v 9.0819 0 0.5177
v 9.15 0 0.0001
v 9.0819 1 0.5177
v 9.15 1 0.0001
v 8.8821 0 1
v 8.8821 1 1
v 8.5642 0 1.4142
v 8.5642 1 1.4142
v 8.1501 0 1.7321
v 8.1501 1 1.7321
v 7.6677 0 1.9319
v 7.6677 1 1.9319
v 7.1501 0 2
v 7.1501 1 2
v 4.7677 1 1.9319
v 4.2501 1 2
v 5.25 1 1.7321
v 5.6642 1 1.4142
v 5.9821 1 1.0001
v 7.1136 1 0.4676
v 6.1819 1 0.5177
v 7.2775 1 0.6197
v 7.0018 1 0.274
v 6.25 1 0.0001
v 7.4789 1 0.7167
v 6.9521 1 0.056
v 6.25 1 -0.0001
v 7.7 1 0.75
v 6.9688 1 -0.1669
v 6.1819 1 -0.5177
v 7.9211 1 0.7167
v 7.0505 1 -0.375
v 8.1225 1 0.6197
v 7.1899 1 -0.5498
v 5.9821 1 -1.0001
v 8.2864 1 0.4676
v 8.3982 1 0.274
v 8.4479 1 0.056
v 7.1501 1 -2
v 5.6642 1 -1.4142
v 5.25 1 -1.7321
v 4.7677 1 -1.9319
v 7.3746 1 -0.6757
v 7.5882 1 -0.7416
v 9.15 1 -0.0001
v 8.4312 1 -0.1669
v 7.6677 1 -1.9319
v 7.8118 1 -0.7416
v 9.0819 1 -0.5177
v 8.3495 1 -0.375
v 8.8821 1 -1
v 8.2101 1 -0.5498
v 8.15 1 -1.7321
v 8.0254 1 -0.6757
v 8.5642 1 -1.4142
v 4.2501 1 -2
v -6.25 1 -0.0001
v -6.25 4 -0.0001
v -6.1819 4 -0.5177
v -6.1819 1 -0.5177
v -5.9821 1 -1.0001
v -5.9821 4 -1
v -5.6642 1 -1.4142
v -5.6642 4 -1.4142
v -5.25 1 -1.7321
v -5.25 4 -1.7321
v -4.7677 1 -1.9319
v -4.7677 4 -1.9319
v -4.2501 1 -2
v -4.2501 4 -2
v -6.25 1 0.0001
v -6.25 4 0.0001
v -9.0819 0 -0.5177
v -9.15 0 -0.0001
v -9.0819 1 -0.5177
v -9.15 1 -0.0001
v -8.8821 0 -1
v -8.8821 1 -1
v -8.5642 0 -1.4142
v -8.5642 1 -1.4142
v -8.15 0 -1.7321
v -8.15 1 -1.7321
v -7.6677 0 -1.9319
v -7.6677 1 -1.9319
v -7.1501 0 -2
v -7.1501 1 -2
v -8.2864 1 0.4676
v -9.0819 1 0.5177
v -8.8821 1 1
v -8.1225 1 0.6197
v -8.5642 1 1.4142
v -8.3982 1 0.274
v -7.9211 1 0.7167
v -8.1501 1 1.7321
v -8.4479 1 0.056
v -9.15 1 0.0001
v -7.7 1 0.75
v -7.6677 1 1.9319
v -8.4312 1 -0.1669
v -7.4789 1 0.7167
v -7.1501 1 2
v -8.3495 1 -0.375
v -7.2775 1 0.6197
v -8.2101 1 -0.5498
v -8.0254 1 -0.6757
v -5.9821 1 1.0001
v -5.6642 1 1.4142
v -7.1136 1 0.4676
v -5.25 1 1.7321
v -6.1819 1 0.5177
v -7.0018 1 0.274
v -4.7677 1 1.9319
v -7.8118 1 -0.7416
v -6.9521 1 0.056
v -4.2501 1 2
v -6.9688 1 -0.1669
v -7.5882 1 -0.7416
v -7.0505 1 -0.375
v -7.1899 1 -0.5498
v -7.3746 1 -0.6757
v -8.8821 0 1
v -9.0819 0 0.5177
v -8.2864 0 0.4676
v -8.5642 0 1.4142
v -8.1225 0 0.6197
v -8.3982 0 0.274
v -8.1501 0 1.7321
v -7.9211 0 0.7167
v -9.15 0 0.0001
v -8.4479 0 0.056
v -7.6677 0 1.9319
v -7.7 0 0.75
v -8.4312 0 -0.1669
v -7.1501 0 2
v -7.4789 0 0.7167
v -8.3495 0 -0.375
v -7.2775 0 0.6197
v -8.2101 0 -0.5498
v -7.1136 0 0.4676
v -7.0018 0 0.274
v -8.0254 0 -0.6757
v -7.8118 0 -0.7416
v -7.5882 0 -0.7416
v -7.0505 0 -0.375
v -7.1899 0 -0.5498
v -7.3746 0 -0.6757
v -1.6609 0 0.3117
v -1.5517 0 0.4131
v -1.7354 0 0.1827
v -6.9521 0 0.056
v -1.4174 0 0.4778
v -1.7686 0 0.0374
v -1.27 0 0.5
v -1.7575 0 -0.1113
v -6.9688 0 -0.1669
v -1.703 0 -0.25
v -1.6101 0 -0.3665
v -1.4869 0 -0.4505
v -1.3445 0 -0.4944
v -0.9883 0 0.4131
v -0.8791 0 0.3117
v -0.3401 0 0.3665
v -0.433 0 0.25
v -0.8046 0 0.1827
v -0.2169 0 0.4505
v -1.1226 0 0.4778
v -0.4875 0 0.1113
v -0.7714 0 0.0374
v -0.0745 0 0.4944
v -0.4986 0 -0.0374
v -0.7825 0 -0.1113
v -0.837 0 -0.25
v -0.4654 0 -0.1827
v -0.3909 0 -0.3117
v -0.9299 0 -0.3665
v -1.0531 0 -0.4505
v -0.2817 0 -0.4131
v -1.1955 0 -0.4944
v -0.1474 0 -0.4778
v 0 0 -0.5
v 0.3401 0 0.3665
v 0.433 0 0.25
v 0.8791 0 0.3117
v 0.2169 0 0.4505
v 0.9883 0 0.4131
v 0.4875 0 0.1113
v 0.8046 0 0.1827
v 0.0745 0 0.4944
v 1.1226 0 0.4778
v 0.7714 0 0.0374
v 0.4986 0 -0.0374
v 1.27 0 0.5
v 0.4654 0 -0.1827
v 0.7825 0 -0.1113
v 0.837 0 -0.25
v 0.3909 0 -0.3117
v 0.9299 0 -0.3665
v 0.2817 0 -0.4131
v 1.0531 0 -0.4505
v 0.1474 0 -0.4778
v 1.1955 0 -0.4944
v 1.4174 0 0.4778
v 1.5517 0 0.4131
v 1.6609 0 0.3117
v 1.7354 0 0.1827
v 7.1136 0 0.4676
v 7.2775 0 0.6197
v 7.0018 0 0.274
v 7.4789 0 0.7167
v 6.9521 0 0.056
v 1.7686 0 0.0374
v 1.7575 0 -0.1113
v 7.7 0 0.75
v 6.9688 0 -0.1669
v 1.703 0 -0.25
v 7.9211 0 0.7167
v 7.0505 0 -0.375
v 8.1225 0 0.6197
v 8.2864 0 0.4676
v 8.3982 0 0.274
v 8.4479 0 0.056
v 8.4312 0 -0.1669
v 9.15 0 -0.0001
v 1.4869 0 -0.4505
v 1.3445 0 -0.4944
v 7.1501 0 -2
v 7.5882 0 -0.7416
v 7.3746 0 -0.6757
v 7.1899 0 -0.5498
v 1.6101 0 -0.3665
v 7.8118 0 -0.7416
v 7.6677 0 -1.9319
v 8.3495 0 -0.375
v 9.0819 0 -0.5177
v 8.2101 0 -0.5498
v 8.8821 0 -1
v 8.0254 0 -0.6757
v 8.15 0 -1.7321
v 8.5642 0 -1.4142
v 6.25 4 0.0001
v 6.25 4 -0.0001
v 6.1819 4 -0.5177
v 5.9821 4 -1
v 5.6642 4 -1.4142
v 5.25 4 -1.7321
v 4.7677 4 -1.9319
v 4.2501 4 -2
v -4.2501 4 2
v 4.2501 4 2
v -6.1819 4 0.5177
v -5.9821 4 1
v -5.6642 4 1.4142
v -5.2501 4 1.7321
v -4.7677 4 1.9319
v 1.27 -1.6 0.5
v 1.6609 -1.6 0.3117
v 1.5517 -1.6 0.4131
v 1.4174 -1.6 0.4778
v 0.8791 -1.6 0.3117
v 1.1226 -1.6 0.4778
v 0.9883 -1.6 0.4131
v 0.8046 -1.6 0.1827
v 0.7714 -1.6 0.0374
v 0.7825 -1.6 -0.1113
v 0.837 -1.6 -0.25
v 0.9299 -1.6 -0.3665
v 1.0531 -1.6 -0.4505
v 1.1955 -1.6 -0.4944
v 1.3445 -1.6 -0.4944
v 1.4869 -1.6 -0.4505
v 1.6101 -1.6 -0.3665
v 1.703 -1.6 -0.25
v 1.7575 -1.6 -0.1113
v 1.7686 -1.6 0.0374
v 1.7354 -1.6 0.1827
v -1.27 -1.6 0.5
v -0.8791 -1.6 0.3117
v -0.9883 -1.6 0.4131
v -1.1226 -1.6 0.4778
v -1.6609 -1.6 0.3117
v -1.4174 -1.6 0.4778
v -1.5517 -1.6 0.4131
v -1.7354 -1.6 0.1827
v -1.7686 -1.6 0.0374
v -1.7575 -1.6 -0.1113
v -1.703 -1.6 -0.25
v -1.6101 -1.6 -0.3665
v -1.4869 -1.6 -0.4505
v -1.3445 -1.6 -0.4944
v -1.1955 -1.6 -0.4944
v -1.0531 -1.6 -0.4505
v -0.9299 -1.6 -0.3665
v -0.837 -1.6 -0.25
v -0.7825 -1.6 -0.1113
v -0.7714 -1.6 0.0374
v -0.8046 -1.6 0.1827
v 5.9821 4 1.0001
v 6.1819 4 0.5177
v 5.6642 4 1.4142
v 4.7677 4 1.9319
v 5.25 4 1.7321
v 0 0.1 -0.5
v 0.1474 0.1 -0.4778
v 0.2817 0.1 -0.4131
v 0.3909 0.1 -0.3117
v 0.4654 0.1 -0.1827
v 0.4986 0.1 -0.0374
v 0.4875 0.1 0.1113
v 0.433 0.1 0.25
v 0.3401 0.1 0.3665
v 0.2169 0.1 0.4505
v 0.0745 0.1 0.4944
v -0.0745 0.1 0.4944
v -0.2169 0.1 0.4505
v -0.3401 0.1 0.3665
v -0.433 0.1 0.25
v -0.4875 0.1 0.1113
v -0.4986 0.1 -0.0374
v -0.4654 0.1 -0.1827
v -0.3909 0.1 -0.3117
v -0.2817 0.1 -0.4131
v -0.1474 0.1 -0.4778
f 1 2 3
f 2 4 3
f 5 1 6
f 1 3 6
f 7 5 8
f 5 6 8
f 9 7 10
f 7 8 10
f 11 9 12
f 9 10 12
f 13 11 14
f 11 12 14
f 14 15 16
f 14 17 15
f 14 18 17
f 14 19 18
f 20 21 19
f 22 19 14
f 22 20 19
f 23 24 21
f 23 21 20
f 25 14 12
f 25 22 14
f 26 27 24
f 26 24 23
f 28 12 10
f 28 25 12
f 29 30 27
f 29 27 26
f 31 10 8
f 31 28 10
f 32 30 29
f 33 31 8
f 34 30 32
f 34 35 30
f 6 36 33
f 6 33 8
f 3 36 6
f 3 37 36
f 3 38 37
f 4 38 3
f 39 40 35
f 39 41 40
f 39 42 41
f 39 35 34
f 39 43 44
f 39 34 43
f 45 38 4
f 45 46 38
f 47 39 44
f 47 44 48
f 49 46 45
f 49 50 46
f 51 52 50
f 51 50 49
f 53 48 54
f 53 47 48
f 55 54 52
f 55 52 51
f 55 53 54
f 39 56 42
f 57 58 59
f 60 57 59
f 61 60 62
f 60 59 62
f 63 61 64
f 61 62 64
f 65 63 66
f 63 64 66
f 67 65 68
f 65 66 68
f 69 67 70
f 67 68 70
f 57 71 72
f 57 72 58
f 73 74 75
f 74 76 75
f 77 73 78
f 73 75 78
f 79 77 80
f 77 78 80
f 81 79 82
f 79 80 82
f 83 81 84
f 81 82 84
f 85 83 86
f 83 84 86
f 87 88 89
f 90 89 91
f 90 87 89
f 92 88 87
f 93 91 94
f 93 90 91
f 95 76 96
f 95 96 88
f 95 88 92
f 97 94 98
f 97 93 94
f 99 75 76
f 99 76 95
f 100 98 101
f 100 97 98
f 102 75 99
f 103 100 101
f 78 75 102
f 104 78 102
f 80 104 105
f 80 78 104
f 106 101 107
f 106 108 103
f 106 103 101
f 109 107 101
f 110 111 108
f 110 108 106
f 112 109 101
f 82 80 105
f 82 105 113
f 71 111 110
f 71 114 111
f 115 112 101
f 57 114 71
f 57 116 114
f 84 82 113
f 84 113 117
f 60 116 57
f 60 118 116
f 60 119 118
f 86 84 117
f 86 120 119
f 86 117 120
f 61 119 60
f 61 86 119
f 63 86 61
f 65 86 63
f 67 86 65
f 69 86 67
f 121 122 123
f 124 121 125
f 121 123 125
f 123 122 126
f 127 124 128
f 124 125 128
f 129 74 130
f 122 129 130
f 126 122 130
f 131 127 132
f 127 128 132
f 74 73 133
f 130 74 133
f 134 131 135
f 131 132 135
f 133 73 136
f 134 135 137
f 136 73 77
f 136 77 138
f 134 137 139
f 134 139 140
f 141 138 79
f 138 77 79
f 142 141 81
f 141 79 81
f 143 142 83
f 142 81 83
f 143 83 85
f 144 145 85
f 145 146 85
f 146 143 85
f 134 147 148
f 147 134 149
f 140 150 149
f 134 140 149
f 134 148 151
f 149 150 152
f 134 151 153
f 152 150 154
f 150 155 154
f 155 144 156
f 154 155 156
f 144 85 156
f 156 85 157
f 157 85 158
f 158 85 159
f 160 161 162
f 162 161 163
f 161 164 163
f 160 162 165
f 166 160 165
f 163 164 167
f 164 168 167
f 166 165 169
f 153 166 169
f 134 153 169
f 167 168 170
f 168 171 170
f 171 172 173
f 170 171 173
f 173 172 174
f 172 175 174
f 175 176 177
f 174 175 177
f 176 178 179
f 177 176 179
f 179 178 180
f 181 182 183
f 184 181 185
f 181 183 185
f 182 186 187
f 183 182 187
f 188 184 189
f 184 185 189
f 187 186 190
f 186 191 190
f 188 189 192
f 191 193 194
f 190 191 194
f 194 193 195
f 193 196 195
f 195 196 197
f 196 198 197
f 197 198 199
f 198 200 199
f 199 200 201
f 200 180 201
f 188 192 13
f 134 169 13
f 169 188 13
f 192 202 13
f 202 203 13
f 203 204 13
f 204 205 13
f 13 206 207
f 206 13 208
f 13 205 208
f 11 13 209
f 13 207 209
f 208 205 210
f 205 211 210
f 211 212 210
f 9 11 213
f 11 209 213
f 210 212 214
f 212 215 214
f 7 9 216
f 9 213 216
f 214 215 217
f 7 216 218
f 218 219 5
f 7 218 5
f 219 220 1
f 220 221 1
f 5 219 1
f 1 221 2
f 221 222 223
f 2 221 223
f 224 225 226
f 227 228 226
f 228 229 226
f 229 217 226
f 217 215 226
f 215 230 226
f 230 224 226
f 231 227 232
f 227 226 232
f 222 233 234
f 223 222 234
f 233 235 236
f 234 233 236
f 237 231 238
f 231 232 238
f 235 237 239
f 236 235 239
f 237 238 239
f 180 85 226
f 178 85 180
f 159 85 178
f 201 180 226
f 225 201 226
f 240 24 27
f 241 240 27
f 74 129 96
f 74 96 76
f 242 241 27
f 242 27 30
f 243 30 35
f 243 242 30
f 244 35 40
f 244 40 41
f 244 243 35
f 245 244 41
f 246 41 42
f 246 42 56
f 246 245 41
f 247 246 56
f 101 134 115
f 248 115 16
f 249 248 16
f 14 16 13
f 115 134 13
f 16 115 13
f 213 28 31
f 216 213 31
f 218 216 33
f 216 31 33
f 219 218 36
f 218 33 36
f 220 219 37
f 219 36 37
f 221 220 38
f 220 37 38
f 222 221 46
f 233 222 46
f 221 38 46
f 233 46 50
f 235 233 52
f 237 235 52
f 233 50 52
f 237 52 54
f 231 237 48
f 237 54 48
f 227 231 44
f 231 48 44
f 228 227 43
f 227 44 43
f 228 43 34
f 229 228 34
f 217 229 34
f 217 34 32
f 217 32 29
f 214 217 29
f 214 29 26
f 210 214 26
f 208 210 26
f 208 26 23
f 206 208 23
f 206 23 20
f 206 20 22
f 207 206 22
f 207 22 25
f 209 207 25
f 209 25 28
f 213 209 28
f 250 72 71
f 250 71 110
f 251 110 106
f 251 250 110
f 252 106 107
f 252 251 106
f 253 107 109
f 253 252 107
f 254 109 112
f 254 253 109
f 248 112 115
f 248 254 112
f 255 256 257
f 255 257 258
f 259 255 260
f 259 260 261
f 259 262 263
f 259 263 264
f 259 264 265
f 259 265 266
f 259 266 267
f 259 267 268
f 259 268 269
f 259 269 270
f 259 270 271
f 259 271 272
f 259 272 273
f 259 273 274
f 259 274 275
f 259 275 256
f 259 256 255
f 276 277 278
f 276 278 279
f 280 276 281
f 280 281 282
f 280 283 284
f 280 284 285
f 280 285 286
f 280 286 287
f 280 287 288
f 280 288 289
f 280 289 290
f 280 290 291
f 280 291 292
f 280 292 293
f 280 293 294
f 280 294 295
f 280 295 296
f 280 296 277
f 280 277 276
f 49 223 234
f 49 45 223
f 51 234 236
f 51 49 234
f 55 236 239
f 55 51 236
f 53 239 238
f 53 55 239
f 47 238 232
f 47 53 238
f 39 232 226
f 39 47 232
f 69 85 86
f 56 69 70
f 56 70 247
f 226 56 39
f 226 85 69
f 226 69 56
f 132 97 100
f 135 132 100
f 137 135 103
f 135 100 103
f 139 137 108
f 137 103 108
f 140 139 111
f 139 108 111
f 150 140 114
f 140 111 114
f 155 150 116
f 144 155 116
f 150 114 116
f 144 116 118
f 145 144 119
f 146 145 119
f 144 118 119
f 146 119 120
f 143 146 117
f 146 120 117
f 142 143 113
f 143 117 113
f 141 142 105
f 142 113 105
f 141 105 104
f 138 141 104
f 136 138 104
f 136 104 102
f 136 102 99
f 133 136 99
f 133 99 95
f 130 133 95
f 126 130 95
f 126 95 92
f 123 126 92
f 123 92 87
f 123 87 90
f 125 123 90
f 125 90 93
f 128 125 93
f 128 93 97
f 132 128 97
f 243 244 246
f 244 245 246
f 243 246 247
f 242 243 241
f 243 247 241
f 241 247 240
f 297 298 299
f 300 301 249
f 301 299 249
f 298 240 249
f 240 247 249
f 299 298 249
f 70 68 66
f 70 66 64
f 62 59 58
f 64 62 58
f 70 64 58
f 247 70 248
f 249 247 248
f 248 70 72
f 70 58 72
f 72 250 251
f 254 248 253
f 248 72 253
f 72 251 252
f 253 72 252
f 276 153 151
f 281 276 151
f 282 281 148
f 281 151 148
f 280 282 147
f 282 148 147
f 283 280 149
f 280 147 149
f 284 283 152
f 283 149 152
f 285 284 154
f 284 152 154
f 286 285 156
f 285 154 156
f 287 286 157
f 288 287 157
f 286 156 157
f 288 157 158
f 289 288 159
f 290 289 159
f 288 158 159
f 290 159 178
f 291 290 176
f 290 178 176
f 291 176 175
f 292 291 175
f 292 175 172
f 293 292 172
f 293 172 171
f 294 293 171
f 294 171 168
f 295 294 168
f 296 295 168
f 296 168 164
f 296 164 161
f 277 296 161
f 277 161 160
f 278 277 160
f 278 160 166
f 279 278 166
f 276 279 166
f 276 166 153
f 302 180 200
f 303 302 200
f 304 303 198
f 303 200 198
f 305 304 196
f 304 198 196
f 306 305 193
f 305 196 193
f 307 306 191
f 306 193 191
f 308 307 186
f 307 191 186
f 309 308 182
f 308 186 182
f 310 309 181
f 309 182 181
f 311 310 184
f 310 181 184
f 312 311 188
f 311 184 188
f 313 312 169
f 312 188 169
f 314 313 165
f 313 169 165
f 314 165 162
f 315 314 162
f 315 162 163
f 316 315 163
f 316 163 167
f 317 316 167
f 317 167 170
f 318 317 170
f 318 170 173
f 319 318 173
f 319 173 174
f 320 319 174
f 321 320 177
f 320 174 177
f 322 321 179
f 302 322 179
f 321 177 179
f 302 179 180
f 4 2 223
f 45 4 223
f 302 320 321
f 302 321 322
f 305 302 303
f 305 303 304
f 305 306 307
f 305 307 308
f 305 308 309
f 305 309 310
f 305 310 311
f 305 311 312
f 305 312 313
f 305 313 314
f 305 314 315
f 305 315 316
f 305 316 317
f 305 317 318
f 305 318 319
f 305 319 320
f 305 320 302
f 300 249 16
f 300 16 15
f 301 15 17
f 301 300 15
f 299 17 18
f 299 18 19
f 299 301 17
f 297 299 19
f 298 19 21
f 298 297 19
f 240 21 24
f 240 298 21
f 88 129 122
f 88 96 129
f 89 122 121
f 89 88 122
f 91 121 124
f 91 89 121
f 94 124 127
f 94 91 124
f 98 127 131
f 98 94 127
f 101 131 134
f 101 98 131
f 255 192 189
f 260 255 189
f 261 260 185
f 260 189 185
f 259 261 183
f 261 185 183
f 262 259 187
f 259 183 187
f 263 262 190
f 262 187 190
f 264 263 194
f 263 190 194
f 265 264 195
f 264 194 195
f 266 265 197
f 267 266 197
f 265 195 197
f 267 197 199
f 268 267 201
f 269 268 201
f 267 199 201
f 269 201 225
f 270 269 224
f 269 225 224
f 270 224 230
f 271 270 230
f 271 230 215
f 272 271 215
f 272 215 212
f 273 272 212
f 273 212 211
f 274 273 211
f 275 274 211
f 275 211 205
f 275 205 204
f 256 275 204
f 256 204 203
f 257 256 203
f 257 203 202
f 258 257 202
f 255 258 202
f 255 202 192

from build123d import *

# Parameters (mm, degrees)
SKETCH_1_W          = 12.5
SKETCH_1_H          = 4
EXTRUDE_1_DEPTH     = 4
FILLET_1_R          = 2
SKETCH_1_3_W        = 18.3
SKETCH_1_3_H        = 4
EXTRUDE_2_DEPTH     = 1
FILLET_2_R          = 2
SKETCH_2_R          = 0.75
CUT_EXTRUDE_1_DEPTH = 10.834759784
EXTRUDE_START       = -4
SKETCH_3_R          = 0.5
EXTRUDE_3_DEPTH     = 5.6
SKETCH_4_R          = 0.5
CUT_EXTRUDE_2_DEPTH = 0.1


with BuildPart() as part:
    # 草图1 → 凸台-拉伸1 (new body)
    with BuildSketch(Plane(origin=(0, 0, 0), x_dir=(1, 0, 0), z_dir=(0, 1, 0))):
        Rectangle(SKETCH_1_W, SKETCH_1_H)
    extrude(amount=EXTRUDE_1_DEPTH)

    # 圆角1
    fillet_1_edges = [part.edges().sort_by_distance(p)[0] for p in [
        (6.25, 2, -2),
        (6.25, 2, 2),
        (-6.25, 2, 2),
        (-6.25, 2, -2),
    ]]
    fillet(fillet_1_edges, radius=FILLET_1_R - 0.0001)  # a hair under: the kernel refuses the full size

    # 草图1<3> → 凸台-拉伸2 (add)
    with BuildSketch(Plane(origin=(0, 0, 0), x_dir=(1, 0, 0), z_dir=(0, 1, 0))):
        Rectangle(SKETCH_1_3_W, SKETCH_1_3_H)
    extrude(amount=EXTRUDE_2_DEPTH)

    # 圆角2
    fillet_2_edges = [part.edges().sort_by_distance(p)[0] for p in [
        (9.15, 0.5, 2),
        (9.15, 0.5, -2),
        (-9.15, 0.5, 2),
        (-9.15, 0.5, -2),
    ]]
    fillet(fillet_2_edges, radius=FILLET_2_R - 0.0001)  # a hair under: the kernel refuses the full size

    # 草图2 → 切除-拉伸1 (cut, through all)
    with BuildSketch(Plane(origin=(0, 1, 0), x_dir=(1, 0, 0), z_dir=(0, 1, 0))):
        with Locations(Location((-7.7, 0, 0), (0, 0, 270))):
            Circle(SKETCH_2_R)
        with Locations(Location((7.7, 0, 0), (0, 0, 270))):
            Circle(SKETCH_2_R)
    extrude(amount=-CUT_EXTRUDE_1_DEPTH, mode=Mode.SUBTRACT)

    # 草图3 → 凸台-拉伸3 (add)
    with BuildSketch(Plane.XZ.offset(EXTRUDE_START)):
        with Locations(Location((-1.27, 0, 0), (0, 0, 90))):
            Circle(SKETCH_3_R)
        with Locations(Location((1.27, 0, 0), (0, 0, 90))):
            Circle(SKETCH_3_R)
    extrude(amount=EXTRUDE_3_DEPTH)

    # 草图4 → 切除-拉伸2 (cut)
    with BuildSketch(Plane.XZ):
        with Locations(Location((0, 0, 0), (0, 0, 270))):
            Circle(SKETCH_4_R)
    extrude(amount=-CUT_EXTRUDE_2_DEPTH, mode=Mode.SUBTRACT)


solid = part.part
